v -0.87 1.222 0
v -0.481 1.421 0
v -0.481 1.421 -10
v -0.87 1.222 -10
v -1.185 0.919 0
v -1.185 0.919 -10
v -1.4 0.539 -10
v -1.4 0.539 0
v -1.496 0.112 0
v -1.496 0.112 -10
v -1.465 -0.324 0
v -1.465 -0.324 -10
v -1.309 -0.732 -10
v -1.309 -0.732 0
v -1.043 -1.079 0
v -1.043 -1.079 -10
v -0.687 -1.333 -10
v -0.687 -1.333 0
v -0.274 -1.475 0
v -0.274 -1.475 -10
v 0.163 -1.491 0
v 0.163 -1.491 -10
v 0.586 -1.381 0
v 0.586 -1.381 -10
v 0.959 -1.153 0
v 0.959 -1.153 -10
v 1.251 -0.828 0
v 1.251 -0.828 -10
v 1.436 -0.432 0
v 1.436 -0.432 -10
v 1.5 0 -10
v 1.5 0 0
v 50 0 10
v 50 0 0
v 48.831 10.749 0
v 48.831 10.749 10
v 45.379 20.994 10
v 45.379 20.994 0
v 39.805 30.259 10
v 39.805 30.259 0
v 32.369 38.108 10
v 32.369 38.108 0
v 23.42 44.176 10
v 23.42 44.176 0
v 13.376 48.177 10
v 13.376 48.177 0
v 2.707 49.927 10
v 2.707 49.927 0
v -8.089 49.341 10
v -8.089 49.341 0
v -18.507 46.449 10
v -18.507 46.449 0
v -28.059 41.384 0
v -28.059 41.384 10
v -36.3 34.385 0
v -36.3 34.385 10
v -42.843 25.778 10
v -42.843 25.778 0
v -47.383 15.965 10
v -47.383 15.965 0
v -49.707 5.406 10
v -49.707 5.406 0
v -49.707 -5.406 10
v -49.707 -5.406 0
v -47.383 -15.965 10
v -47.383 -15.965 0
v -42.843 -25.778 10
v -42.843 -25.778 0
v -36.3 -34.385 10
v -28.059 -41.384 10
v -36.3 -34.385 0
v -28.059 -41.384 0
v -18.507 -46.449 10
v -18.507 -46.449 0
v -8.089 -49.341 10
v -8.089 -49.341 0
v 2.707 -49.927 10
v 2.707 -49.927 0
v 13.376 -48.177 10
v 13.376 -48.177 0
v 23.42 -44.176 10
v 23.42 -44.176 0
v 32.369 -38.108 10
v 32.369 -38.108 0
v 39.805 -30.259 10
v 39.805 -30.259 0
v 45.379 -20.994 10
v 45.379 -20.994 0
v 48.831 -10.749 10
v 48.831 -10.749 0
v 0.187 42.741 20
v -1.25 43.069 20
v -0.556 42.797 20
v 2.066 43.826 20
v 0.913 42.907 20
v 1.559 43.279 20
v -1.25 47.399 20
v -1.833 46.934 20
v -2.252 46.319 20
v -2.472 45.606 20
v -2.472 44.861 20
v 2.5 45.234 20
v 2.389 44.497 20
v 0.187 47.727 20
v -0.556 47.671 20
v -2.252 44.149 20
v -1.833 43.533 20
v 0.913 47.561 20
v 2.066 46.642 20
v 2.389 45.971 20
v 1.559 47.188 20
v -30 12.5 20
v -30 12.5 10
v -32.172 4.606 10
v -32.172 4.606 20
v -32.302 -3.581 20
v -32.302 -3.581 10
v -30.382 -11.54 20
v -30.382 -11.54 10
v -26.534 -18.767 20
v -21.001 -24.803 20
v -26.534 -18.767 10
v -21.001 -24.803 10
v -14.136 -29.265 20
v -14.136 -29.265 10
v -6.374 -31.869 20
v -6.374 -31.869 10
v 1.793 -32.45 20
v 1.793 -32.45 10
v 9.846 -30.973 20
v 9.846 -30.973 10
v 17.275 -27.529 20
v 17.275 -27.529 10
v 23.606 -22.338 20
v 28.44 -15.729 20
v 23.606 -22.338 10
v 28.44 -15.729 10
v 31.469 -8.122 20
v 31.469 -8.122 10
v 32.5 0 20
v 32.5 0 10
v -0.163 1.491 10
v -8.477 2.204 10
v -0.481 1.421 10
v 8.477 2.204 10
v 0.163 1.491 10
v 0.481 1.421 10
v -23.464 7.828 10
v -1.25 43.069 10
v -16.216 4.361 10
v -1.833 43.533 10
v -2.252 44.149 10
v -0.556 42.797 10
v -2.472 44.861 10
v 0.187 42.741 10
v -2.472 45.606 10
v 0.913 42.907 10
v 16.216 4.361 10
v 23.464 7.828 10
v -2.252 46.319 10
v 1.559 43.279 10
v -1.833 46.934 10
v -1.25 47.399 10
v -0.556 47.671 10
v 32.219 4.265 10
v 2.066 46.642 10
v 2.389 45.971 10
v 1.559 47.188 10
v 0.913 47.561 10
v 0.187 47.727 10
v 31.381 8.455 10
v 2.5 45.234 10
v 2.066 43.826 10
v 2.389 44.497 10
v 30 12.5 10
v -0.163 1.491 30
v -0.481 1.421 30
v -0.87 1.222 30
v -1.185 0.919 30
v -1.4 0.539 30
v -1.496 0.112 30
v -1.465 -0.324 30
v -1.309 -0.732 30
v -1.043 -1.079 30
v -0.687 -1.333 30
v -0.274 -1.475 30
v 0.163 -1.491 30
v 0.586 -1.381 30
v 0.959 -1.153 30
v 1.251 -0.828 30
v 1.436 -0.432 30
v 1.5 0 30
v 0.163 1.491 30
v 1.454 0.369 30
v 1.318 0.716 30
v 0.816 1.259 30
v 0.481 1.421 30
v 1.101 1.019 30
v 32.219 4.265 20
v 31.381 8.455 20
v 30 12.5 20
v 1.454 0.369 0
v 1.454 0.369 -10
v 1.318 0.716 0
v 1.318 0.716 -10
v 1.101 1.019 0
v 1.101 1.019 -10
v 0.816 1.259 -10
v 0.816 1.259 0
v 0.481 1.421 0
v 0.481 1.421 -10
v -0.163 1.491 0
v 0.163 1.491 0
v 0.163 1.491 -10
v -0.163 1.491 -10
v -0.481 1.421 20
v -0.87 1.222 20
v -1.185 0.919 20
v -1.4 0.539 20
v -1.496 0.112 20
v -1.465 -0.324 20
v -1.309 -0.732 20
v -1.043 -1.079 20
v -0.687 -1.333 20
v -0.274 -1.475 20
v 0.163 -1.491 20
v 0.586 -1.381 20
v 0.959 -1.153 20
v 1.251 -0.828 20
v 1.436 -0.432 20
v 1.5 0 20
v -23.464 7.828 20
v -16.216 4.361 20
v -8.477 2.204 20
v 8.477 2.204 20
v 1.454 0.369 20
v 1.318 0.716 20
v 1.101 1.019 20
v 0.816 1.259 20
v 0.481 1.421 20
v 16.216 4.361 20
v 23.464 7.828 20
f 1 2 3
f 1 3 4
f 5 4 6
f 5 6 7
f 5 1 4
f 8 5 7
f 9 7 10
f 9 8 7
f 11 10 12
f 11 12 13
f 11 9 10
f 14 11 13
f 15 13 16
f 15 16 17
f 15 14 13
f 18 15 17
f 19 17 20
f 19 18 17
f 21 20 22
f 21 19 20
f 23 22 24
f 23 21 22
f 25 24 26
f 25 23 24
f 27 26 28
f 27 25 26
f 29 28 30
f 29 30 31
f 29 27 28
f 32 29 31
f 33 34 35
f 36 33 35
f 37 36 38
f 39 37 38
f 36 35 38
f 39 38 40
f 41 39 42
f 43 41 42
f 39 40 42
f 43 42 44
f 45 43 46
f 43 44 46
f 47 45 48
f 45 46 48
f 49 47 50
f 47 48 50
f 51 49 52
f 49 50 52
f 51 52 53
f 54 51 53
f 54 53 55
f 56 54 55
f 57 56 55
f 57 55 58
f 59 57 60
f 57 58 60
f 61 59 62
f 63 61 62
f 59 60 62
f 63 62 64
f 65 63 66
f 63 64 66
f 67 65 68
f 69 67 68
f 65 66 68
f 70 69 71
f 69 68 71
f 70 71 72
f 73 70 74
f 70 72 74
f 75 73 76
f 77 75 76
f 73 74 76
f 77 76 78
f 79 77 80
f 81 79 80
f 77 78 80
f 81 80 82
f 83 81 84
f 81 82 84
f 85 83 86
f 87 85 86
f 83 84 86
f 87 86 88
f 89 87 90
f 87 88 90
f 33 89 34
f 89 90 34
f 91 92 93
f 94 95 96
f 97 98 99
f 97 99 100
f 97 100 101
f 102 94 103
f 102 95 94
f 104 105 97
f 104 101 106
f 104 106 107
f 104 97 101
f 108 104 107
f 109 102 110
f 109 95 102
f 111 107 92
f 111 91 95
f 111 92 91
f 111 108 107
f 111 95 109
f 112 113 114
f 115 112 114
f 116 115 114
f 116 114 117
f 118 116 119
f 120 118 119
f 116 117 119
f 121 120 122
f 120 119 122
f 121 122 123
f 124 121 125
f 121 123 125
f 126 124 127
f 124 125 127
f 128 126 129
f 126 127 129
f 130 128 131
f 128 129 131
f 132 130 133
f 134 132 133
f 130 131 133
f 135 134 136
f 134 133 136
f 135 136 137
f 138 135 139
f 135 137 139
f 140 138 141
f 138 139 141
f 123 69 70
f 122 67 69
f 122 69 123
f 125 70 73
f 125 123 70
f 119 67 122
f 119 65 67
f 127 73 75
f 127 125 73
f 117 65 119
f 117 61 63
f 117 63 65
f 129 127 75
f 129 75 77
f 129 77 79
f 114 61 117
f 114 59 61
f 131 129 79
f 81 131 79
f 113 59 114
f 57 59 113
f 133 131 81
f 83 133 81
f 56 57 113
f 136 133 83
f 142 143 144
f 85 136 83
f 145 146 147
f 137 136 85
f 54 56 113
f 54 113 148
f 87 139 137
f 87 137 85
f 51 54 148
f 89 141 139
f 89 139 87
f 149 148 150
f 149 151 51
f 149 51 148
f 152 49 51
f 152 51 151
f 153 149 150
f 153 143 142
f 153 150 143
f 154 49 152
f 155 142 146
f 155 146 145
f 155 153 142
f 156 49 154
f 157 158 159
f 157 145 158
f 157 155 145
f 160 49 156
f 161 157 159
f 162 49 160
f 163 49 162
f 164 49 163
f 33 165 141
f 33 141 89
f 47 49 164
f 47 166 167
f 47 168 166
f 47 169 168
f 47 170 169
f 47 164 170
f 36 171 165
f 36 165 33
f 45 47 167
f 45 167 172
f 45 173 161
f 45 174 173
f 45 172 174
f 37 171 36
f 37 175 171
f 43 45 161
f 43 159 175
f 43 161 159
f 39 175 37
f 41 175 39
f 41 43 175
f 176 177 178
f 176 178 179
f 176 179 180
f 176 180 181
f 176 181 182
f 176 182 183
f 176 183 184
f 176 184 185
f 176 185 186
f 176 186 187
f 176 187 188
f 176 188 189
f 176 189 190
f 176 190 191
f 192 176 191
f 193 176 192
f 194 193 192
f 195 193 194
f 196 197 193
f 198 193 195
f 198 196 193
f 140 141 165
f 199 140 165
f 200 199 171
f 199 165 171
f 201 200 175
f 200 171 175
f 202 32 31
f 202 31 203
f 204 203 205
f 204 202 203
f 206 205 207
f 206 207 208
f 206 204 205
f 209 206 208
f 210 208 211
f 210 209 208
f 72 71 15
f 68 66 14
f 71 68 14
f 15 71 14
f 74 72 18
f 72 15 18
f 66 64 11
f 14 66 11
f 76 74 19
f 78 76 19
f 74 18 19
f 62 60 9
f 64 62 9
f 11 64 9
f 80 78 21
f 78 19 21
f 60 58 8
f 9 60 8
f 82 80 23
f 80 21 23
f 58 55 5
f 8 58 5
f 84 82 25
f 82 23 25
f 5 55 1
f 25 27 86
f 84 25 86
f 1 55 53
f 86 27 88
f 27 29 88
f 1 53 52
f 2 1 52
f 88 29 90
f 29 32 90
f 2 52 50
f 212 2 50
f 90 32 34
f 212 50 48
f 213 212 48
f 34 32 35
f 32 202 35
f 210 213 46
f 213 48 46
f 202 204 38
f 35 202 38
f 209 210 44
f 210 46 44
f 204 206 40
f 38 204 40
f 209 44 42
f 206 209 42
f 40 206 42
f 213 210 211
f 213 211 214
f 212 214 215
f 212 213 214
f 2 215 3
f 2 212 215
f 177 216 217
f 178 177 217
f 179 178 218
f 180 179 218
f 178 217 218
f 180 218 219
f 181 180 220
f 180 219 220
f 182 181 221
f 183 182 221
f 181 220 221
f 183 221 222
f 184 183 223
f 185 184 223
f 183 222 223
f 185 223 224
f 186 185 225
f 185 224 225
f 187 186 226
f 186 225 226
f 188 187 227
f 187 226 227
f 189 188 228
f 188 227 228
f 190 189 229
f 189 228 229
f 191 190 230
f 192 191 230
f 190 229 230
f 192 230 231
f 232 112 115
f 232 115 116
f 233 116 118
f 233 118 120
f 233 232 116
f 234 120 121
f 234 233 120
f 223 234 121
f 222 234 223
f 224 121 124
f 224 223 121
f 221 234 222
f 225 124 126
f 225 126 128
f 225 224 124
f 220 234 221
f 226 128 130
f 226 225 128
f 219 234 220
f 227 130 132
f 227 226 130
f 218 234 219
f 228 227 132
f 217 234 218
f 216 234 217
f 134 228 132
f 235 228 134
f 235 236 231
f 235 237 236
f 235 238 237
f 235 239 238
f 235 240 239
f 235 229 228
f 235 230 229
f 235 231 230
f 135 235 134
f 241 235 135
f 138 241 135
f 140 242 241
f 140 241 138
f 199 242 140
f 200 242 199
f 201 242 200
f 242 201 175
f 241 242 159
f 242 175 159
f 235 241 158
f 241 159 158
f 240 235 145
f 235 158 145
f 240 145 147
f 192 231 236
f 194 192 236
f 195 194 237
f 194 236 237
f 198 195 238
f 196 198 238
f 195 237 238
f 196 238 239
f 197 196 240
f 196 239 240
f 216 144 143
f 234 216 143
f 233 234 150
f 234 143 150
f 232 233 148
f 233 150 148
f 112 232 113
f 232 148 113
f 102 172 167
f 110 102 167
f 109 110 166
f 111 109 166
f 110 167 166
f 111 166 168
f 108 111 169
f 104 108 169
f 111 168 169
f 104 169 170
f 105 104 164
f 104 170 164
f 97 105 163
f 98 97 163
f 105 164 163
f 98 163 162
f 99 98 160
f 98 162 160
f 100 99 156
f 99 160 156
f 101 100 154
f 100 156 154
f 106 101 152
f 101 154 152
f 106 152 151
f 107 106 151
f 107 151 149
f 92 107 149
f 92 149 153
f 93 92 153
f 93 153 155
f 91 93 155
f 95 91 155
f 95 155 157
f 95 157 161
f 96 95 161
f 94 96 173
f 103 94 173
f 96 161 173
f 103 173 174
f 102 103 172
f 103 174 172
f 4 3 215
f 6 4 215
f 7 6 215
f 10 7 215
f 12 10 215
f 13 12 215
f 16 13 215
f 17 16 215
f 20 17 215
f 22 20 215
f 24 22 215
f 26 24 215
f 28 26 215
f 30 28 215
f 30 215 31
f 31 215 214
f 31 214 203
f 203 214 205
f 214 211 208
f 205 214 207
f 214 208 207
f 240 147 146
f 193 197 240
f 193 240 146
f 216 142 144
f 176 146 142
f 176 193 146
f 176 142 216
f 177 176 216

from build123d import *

# Parameters (mm, degrees)
F0_R          = 50
F1_DEPTH      = 10
F3_DEPTH      = 10
F5_DEPTH      = 10
F5_DEPTH_BACK = 30
F7_R          = 2.5
F8_DEPTH      = 10


with BuildPart() as f1:
    # F0 (on Top) → F1 (new body)
    with BuildSketch(Plane.XY):
        Circle(F0_R)
    extrude(amount=F1_DEPTH)

    # F2 (on face) → F3 (join)
    with BuildSketch(Plane.XY.offset(10)):
        with BuildLine():
            ThreePointArc((-30, 12.5), (-6.373774392, -31.86887196), (32.5, 0))
            ThreePointArc((32.5, 0), (31.86887196, 6.373774392), (30, 12.5))
            ThreePointArc((30, 12.5), (0, 1.418320568), (-30, 12.5))
        make_face()
    extrude(amount=F3_DEPTH)

    # F4 (on face) → F5 (join, two sides)
    with BuildSketch(Plane.XY.offset(20)) as f5_sk:
        with BuildLine():
            ThreePointArc((-0.4808877088, 1.4208261722), (0, 1.418320568), (0.4808877088, 1.4208261722))
            ThreePointArc((0.4808877088, 1.4208261722), (0, 1.5), (-0.4808877088, 1.4208261722))
        make_face()
        with BuildLine():
            ThreePointArc((-0.4808877088, 1.4208261722), (-0.8742620994, -1.2188789036), (1.5, 0))
            ThreePointArc((1.5, 0), (1.2188789036, 0.8742620994), (0.4808877088, 1.4208261722))
            ThreePointArc((0.4808877088, 1.4208261722), (0, 1.418320568), (-0.4808877088, 1.4208261722))
        make_face()
    extrude(amount=F5_DEPTH)
    extrude(f5_sk.sketch, amount=-F5_DEPTH_BACK)

    # F7 (on face) → F8 (join)
    with BuildSketch(Plane.XY.offset(10)):
        with Locations((0, 45.2338345349)):
            Circle(F7_R)
    extrude(amount=F8_DEPTH)


solid = f1.part
